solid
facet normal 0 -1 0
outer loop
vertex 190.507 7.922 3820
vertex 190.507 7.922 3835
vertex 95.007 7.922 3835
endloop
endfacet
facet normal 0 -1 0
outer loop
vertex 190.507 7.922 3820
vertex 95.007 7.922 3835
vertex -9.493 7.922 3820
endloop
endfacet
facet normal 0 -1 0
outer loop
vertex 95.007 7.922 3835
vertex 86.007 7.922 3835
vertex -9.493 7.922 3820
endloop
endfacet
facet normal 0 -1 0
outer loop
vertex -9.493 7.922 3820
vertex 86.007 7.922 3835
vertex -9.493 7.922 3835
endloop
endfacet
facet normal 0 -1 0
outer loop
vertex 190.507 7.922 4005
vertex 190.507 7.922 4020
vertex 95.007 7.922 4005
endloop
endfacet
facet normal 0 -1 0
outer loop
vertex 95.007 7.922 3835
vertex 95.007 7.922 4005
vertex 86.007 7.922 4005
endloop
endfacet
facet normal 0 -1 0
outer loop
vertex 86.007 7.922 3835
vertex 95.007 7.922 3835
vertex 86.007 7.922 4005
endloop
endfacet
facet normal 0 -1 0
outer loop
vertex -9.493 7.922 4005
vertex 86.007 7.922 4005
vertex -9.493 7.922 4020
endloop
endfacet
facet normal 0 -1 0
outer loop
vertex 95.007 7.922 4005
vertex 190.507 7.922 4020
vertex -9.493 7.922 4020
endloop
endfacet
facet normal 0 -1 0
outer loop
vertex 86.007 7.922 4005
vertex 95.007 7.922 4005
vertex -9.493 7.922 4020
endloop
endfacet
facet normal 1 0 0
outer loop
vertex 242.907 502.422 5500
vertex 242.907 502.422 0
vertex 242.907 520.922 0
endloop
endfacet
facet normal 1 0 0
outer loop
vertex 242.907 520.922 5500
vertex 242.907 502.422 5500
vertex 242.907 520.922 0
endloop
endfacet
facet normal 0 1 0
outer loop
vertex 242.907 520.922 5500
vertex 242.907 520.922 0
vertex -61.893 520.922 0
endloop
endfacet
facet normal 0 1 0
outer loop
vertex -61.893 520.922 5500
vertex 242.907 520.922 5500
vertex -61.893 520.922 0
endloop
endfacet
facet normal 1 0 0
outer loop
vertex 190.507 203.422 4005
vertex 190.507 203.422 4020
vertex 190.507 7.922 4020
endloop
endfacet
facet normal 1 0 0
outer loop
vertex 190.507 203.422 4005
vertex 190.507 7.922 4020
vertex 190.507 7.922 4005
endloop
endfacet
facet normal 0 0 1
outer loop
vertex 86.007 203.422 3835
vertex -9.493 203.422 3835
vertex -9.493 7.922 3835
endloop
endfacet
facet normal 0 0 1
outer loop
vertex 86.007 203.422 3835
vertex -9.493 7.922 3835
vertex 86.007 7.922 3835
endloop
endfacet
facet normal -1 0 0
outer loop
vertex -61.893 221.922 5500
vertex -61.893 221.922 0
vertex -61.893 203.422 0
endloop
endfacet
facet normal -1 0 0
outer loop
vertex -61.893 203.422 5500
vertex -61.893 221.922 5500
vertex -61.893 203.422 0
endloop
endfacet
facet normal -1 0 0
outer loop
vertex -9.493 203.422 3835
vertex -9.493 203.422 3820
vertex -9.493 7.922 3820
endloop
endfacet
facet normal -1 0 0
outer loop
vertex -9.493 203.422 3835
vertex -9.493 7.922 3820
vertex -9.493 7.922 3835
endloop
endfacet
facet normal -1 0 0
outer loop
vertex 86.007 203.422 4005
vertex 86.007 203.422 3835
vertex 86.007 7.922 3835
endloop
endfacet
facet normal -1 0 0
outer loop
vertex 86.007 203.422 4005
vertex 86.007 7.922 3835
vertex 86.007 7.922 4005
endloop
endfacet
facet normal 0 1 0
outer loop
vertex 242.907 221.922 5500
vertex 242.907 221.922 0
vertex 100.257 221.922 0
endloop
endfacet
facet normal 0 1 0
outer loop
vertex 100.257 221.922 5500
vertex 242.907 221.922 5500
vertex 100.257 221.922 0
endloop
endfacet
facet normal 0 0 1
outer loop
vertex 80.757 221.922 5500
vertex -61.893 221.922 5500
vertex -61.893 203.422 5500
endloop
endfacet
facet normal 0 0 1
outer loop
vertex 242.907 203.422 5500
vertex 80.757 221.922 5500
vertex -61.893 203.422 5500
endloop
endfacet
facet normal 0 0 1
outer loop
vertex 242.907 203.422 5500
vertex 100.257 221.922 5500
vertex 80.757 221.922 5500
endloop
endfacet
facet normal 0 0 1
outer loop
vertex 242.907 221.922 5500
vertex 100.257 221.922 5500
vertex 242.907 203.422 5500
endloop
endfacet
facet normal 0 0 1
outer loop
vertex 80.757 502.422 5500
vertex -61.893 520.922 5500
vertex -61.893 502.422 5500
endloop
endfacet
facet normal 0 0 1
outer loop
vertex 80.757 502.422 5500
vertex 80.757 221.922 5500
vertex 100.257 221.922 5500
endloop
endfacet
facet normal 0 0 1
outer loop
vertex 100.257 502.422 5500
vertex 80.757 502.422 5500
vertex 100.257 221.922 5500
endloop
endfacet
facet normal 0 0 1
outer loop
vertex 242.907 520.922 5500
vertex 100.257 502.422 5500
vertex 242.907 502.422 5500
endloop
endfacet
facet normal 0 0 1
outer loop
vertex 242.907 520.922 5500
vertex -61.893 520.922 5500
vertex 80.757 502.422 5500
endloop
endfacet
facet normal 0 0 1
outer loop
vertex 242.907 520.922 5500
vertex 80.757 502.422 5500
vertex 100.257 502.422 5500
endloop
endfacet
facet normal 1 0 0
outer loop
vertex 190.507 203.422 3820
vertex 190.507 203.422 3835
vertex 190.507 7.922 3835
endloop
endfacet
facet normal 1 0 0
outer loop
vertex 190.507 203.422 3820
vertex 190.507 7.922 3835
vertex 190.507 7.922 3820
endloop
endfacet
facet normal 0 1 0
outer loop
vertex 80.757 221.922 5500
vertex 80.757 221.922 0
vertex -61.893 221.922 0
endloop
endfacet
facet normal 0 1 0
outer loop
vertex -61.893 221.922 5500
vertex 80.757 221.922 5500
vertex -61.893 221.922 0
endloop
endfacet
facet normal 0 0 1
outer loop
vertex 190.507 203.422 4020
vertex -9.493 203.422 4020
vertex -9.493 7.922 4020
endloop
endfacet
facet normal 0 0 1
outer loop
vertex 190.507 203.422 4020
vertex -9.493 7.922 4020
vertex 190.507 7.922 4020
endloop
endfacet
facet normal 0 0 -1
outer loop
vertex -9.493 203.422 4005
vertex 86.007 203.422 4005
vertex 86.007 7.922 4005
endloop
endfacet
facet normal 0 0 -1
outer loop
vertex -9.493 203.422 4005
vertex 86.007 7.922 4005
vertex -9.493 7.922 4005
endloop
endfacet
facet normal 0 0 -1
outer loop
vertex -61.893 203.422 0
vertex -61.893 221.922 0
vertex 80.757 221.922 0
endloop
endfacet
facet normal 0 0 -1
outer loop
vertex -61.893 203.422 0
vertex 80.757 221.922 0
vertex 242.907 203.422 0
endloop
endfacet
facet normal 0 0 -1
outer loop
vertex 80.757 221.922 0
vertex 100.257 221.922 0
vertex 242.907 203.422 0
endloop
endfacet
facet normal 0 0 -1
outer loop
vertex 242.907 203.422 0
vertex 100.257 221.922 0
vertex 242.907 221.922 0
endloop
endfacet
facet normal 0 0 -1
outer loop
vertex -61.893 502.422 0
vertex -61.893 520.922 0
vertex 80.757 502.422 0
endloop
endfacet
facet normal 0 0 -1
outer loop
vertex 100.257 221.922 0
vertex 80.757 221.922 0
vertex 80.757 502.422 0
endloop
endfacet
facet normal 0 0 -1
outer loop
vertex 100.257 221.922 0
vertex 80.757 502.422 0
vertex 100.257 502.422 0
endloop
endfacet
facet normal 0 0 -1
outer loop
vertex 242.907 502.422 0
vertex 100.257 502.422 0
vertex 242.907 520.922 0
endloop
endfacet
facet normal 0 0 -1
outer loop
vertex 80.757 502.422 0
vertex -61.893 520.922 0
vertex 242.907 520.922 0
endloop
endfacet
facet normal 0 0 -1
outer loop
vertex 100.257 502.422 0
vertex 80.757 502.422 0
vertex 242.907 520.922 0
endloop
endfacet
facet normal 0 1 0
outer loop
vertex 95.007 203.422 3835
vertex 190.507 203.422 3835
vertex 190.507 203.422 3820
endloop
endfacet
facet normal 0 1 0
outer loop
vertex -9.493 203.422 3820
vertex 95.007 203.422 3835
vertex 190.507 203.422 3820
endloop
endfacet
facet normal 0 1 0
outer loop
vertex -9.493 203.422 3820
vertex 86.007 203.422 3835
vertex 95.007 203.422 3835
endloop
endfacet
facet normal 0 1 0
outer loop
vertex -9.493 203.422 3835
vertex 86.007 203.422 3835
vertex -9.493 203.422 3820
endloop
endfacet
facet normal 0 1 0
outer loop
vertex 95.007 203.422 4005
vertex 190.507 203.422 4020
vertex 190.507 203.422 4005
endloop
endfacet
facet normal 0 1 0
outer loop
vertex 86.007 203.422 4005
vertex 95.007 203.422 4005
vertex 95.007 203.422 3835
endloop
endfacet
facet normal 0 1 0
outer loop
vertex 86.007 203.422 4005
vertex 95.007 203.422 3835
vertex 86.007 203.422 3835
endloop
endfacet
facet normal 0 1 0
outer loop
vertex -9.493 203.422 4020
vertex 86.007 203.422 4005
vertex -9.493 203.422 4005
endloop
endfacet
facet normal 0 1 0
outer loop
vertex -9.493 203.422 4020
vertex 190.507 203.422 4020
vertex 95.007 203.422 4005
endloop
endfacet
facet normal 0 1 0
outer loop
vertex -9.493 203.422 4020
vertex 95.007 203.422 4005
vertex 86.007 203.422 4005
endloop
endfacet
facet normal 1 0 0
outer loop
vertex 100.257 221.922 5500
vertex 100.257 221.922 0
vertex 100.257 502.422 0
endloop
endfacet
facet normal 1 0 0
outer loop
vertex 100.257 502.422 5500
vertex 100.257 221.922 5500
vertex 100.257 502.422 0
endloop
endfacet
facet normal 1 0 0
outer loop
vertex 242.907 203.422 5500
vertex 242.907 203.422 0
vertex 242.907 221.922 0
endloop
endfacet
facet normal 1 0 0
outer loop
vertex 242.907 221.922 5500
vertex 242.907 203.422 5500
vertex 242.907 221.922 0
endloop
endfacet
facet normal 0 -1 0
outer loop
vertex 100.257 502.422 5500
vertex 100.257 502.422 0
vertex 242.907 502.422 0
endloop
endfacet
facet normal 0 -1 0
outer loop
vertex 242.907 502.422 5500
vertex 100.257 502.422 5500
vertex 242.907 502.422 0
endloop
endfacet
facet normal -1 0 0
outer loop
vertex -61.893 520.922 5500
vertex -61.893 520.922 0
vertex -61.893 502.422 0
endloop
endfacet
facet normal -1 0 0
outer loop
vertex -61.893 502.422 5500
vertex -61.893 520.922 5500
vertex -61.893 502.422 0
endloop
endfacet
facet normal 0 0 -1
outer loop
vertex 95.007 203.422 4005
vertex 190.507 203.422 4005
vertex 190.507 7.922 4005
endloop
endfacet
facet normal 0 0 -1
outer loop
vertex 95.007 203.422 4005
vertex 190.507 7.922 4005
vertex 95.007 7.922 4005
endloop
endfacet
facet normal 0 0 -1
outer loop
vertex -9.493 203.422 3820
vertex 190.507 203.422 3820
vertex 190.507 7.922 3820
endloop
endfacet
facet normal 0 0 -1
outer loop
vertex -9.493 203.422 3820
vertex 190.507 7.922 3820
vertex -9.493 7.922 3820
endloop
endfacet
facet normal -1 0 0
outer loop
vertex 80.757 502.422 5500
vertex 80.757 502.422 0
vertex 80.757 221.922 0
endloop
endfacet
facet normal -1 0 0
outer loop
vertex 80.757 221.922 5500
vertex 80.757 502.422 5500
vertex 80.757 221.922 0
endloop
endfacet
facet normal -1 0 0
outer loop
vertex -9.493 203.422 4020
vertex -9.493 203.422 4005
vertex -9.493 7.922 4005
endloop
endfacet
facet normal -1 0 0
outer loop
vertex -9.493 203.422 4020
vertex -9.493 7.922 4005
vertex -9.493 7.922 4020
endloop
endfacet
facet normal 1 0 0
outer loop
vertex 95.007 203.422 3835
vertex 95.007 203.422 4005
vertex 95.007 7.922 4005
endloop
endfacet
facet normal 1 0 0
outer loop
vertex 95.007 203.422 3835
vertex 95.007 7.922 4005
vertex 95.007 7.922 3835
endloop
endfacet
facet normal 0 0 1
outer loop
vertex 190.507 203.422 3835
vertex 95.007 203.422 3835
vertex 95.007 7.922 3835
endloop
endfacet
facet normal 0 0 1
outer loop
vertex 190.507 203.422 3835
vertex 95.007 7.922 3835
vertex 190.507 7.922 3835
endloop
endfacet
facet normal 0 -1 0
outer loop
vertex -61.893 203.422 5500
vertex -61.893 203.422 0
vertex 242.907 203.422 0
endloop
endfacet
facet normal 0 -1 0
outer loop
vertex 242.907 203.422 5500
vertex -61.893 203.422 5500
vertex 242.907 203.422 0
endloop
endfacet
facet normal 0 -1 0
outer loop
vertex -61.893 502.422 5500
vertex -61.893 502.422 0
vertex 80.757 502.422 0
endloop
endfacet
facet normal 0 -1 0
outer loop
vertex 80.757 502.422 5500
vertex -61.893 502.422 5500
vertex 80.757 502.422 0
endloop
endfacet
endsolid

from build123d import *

# Parameters (mm, degrees)
BOSS_EXTRUDE7_DEPTH = 5500
BOSS_EXTRUDE8_DEPTH = 195.5


with BuildPart() as part:
    # Sketch7 → Boss-Extrude7 (new body)
    with BuildSketch(Plane.XY):
        Polygon((100.25706083, 502.42188857), (242.907060835, 502.42188857), (242.907060835, 520.92188857), (-61.8929392, 520.92188857), (-61.8929392, 502.42188857), (80.7570608, 502.42188857), (80.7570608, 221.9218886), (-61.8929392, 221.9218886), (-61.8929392, 203.4218886), (242.9070608, 203.4218886), (242.9070608, 221.9218886), (100.25706083, 221.9218886), align=None)
    extrude(amount=BOSS_EXTRUDE7_DEPTH)


with BuildPart() as body_2:
    # Sketch8 → Boss-Extrude8 (new body)
    with BuildSketch(Plane.XZ.offset(-203.4218886)):
        Polygon((-9.4929392, 4020), (190.5070608, 4020), (190.5070608, 4005), (95.0070608, 4005), (95.0070608, 3835), (190.5070608, 3835), (190.5070608, 3820), (-9.4929392, 3820), (-9.4929392, 3835), (86.0070608, 3835), (86.0070608, 4005), (-9.4929392, 4005), align=None)
    extrude(amount=BOSS_EXTRUDE8_DEPTH)


solid = Compound([part.part, body_2.part])
